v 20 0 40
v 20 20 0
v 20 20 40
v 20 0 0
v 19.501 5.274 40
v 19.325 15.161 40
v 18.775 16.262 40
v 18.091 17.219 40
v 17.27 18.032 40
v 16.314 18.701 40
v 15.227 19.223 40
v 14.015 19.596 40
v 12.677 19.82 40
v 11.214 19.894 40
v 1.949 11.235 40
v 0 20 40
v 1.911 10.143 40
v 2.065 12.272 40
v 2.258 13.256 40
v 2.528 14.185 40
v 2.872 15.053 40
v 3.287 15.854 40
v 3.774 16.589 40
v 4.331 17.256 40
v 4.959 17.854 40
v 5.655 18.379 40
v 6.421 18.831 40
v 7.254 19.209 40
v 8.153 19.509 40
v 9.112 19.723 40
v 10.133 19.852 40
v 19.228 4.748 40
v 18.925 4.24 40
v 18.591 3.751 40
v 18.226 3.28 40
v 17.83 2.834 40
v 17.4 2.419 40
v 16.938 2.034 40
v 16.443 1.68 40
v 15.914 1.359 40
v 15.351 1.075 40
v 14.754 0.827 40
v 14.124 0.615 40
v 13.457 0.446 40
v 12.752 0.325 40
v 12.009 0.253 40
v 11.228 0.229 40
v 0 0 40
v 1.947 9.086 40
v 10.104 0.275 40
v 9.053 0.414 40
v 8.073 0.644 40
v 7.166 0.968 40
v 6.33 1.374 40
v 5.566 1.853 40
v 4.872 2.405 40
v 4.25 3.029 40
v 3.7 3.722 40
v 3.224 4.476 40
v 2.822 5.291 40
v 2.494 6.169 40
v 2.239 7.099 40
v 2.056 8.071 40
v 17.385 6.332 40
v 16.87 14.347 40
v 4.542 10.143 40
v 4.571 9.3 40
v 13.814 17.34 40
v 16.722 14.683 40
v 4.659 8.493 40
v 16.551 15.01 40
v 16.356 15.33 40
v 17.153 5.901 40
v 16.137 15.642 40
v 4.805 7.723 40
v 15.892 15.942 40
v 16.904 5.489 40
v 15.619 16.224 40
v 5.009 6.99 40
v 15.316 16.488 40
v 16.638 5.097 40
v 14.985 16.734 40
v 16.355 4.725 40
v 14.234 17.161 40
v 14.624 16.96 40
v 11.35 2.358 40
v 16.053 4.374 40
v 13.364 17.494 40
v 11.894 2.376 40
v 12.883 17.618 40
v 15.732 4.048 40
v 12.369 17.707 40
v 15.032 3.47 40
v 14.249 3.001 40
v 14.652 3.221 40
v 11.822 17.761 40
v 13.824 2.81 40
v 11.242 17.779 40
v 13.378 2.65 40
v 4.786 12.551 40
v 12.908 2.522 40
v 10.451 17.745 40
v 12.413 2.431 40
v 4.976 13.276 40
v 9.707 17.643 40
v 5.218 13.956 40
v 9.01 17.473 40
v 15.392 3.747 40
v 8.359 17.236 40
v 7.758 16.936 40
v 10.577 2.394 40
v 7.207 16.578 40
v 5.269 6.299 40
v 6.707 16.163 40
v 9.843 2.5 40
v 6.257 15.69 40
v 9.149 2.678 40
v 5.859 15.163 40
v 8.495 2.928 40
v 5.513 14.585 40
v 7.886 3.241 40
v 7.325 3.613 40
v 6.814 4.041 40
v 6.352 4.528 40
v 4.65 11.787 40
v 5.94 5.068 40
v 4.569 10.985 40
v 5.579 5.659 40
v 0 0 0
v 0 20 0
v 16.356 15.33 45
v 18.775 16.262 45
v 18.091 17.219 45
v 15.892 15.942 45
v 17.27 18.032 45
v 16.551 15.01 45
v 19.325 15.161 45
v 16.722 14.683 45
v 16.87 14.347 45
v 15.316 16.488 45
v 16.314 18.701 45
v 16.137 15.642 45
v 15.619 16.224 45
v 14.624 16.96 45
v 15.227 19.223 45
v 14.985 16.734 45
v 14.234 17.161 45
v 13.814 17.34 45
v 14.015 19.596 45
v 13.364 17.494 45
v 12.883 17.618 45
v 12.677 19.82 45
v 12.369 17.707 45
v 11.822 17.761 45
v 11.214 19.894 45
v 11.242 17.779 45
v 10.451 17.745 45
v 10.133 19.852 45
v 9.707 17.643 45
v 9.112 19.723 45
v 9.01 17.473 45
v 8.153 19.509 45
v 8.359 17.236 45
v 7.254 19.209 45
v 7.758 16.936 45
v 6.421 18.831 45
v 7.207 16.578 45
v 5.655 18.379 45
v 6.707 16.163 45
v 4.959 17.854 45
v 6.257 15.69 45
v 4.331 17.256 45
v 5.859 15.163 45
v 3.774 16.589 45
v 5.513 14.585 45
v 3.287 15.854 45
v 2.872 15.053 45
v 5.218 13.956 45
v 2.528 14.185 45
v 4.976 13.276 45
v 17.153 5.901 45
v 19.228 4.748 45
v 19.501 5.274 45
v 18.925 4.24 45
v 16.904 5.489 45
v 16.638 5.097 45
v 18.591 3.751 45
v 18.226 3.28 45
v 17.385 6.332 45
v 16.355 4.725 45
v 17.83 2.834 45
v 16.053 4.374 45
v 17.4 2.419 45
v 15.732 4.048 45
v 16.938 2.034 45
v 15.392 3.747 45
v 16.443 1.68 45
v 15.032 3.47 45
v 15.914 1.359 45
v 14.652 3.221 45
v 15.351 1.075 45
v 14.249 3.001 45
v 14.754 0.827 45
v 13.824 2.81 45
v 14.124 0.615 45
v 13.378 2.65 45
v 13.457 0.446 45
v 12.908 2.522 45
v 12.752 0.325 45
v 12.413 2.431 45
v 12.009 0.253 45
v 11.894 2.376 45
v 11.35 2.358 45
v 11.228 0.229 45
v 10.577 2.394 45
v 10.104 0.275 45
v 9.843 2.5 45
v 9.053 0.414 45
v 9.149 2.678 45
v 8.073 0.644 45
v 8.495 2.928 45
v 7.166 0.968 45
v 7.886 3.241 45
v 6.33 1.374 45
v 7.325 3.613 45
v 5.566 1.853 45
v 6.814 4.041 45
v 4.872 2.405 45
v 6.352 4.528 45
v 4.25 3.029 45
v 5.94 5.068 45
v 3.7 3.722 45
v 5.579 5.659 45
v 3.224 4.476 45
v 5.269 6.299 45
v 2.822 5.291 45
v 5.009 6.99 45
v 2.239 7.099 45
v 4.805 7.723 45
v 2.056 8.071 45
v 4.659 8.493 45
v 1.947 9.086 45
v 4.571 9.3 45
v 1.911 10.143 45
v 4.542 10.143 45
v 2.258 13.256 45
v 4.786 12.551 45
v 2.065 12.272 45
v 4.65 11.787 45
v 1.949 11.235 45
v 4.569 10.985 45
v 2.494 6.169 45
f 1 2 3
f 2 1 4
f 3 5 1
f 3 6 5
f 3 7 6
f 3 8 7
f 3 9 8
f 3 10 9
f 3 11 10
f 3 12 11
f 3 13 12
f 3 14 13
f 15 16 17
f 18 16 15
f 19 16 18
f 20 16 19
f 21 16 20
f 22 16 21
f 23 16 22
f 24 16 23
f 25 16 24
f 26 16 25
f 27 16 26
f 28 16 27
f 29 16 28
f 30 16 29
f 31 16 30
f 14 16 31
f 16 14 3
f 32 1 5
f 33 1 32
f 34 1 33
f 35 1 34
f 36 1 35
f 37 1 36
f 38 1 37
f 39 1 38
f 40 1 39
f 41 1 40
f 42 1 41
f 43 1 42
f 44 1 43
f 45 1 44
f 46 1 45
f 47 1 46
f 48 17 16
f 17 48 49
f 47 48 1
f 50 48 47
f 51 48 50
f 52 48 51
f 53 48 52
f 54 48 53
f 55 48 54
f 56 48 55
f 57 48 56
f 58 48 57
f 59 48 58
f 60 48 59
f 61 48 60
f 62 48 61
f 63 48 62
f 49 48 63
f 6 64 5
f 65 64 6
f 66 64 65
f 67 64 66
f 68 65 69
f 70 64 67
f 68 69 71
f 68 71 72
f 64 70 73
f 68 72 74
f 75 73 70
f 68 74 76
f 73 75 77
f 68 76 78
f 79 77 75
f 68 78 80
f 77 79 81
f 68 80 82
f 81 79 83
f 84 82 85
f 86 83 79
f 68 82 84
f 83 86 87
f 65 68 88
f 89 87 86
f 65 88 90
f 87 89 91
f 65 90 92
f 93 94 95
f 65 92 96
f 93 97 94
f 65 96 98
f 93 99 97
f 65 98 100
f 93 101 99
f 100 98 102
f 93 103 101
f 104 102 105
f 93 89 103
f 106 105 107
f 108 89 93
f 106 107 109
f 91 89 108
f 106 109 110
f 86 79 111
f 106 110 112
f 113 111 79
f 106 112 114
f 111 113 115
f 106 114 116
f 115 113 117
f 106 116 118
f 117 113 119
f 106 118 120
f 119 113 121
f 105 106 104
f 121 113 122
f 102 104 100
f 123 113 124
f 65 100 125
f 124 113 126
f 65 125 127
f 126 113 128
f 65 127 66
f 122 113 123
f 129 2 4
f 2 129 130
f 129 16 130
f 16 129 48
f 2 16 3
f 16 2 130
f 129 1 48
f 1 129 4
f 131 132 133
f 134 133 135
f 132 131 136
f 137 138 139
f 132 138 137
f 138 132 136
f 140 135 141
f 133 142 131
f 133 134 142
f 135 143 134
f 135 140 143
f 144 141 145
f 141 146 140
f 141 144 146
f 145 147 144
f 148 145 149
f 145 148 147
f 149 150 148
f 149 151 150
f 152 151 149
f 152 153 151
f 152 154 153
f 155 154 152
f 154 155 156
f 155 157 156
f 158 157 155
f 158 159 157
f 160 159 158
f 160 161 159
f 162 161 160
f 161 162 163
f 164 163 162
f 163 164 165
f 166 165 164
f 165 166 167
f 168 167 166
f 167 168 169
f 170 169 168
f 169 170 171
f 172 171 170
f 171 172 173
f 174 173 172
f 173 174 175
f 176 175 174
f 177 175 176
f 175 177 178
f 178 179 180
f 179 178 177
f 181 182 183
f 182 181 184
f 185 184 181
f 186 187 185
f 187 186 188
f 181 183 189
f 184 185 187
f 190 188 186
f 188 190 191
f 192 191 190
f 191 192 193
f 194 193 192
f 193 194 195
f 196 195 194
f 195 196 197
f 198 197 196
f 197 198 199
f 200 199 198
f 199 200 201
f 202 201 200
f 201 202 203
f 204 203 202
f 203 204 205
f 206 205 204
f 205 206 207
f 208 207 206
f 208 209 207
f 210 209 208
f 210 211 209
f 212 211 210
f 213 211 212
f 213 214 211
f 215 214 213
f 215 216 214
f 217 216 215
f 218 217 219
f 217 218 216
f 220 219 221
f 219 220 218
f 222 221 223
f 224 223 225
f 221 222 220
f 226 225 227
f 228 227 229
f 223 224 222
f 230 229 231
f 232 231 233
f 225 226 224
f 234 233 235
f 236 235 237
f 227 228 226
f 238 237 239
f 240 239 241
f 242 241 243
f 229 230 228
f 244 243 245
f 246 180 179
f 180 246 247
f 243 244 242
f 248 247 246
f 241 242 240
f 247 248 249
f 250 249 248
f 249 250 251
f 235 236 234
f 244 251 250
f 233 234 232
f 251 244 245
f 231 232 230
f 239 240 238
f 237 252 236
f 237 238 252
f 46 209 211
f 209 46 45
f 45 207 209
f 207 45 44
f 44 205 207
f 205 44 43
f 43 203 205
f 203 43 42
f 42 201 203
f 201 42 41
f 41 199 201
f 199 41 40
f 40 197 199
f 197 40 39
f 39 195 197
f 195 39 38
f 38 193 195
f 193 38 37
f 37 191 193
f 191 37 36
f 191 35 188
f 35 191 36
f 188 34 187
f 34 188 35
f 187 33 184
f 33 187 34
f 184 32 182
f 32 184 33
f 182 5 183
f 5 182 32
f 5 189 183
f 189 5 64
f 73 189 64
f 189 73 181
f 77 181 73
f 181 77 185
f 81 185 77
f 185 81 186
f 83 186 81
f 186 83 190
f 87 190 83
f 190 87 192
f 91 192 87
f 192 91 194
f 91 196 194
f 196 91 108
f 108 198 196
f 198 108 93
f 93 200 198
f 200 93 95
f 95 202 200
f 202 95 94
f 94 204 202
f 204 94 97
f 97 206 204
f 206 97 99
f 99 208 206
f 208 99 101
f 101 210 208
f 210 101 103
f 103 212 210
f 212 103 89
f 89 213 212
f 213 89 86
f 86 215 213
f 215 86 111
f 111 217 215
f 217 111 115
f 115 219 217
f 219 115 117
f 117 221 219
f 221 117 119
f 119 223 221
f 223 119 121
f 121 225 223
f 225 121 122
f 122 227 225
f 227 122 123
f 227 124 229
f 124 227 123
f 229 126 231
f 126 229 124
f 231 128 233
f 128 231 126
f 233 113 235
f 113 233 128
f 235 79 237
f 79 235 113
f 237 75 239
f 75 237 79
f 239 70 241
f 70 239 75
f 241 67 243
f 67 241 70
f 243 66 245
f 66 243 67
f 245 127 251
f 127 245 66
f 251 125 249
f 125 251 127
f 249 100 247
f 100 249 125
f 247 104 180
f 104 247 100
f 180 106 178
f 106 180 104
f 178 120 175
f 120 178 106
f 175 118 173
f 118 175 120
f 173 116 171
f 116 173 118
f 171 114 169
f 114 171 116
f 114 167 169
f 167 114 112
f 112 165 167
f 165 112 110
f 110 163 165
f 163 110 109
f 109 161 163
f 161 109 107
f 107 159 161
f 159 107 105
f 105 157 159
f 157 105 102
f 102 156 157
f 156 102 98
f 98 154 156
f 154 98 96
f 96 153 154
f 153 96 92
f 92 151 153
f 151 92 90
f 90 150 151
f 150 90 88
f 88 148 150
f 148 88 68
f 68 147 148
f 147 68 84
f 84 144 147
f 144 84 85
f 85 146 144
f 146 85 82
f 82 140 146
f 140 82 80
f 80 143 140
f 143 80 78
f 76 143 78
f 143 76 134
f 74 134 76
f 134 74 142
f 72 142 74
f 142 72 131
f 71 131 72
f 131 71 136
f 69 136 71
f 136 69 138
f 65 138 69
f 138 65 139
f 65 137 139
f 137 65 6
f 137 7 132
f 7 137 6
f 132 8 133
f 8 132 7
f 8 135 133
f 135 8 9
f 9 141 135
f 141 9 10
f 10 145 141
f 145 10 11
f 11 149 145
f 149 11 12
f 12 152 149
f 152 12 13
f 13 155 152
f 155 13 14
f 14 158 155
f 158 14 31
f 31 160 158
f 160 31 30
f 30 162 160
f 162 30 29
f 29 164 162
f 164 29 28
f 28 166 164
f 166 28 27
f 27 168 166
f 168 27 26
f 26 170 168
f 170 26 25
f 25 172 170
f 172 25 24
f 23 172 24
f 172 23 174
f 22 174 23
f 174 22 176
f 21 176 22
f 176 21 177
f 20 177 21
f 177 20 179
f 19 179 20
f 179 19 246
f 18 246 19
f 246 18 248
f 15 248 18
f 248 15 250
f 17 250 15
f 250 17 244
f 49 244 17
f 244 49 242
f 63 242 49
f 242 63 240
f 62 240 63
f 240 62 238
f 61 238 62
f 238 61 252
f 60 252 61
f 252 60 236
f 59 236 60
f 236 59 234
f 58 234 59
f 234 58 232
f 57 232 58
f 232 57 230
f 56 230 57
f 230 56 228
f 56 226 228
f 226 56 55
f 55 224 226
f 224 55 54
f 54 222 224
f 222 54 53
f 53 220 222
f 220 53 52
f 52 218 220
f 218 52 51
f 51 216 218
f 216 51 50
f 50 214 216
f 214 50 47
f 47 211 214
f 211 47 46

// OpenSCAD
cube([20, 20, 40]);
translate([0.5, 0.5, 40]){
    linear_extrude(5){
        text("C", size=20);
    }
}
